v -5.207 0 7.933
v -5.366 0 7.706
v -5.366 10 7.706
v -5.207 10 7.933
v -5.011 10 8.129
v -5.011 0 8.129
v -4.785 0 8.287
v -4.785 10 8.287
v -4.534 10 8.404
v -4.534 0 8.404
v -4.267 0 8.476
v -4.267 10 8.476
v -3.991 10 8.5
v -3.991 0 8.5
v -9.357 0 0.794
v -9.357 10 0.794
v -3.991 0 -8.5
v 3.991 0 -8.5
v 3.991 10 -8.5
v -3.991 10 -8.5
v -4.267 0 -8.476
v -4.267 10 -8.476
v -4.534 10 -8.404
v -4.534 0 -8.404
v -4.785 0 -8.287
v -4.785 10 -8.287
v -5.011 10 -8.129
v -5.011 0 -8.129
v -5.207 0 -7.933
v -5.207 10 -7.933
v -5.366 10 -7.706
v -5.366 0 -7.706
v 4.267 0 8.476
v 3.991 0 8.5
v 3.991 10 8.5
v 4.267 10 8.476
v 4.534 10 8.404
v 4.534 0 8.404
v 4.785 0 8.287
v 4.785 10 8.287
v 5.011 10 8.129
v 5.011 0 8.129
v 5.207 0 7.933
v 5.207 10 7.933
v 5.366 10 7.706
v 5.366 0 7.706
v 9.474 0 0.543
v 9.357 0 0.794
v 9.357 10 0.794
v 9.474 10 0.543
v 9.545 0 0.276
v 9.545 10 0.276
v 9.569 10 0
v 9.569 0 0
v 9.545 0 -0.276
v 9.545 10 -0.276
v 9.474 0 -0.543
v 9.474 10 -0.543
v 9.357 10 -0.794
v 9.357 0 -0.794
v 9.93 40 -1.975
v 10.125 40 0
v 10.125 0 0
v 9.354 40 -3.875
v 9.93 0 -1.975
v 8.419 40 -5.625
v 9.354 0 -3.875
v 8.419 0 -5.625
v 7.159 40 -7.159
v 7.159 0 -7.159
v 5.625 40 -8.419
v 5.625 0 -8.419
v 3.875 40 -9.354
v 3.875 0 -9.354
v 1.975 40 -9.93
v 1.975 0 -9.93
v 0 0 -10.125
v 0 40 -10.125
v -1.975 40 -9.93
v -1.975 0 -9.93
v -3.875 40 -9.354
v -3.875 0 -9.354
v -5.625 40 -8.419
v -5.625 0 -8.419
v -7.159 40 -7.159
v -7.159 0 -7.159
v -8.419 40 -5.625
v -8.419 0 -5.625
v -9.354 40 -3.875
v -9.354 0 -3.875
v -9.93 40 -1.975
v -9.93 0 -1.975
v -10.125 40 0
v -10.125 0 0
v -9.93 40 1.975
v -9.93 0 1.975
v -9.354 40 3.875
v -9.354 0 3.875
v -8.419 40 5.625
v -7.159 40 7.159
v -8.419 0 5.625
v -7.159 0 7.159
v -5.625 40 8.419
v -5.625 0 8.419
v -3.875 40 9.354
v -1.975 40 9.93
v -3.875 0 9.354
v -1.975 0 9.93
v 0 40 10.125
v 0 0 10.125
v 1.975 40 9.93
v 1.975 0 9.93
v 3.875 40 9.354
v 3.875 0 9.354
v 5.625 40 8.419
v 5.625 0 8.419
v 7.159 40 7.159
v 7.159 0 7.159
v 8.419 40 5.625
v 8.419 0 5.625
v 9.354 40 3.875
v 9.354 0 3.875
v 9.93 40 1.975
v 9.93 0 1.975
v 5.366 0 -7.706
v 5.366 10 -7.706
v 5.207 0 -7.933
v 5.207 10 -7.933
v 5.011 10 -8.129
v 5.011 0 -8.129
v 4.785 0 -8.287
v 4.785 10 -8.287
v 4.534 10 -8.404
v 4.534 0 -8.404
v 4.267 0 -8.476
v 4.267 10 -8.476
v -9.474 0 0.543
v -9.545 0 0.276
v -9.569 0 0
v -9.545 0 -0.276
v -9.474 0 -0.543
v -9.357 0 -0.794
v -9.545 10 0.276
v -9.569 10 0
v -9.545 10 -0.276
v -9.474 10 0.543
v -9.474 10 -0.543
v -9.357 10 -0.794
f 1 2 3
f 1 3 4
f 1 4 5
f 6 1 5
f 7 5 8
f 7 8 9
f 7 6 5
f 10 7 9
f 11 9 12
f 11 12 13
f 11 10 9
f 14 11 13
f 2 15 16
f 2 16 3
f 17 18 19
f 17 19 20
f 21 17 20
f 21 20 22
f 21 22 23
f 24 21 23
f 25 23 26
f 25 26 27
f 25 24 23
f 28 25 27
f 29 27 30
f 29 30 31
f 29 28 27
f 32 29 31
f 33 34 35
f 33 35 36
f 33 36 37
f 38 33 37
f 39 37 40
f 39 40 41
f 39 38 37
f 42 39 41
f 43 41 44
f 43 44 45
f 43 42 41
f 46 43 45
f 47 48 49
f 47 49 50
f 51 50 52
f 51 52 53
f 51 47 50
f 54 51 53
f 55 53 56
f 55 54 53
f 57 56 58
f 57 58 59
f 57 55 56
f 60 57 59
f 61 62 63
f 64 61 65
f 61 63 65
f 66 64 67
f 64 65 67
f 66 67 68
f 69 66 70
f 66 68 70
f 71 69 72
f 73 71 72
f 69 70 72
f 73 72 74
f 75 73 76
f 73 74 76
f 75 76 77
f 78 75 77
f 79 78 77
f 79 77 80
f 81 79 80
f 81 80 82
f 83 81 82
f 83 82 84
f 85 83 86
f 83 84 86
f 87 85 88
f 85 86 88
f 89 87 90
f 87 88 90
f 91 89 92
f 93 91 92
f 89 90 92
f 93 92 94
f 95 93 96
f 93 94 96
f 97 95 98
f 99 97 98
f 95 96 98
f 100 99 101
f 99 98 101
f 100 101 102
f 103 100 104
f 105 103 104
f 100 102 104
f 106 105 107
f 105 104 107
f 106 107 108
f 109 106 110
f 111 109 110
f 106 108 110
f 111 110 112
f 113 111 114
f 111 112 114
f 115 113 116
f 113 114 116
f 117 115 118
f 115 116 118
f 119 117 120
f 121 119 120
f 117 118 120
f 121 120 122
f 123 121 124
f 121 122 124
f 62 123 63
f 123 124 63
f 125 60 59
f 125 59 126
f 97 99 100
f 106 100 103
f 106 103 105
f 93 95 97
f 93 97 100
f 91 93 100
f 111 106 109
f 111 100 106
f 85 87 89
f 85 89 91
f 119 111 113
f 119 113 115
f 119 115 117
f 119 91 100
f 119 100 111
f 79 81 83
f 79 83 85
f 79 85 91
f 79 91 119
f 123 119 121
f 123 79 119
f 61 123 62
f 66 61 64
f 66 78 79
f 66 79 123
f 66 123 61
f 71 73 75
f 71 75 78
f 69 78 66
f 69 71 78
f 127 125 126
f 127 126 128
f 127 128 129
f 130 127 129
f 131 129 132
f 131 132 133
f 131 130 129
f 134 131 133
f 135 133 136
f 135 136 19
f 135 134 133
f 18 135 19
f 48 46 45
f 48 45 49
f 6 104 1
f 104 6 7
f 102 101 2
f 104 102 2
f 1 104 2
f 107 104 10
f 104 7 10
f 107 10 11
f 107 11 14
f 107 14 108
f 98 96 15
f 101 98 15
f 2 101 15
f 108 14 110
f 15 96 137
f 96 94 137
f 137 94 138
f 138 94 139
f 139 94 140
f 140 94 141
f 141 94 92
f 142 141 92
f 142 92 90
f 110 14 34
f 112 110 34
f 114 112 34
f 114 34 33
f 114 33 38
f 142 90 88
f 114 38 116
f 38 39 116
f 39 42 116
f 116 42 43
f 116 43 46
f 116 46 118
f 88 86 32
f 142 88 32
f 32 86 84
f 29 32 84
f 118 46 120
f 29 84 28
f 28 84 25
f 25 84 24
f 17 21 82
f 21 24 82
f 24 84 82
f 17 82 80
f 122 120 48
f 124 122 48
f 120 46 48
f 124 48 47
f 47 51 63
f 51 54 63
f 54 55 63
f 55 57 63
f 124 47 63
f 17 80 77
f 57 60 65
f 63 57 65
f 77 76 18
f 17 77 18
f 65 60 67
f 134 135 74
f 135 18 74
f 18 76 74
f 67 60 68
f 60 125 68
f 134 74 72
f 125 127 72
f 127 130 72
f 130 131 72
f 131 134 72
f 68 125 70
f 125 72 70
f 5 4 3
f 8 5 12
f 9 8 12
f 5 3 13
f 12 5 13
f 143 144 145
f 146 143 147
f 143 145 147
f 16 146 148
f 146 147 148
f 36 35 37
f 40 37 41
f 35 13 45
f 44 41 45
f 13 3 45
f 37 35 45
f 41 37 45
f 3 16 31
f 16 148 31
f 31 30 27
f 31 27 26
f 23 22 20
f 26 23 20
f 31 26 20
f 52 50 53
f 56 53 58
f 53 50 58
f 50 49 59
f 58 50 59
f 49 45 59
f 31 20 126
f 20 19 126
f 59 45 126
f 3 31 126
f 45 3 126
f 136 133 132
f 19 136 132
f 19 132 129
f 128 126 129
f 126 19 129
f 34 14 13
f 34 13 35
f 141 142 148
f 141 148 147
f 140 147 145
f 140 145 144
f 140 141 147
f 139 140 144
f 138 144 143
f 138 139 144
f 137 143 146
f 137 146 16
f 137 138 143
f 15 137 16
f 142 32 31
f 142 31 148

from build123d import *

# Parameters (mm, degrees)
SKETCH1_R           = 10.125
BOSS_EXTRUDE1_DEPTH = 10
SKETCH2_R           = 10.125
BOSS_EXTRUDE2_DEPTH = 30


with BuildPart() as part:
    # Sketch1 → Boss-Extrude1 (new body)
    with BuildSketch(Plane(origin=(0, 0, 0), x_dir=(1, 0, 0), z_dir=(0, 1, 0))):
        Circle(SKETCH1_R)
        with BuildLine():
            Line((9.3566828, 0.79375), (5.365749064, 7.70625))
            ThreePointArc((5.365749064, 7.70625), (4.784683736, 8.287315329), (3.990933736, 8.5))
            Line((3.990933736, 8.5), (-3.990933736, 8.5))
            ThreePointArc((-3.990933736, 8.5), (-4.784683736, 8.287315329), (-5.365749064, 7.70625))
            Line((-5.365749064, 7.70625), (-9.3566828, 0.79375))
            ThreePointArc((-9.3566828, 0.79375), (-9.569367472, 0), (-9.3566828, -0.79375))
            Line((-9.3566828, -0.79375), (-5.365749064, -7.70625))
            ThreePointArc((-5.365749064, -7.70625), (-4.784683736, -8.287315329), (-3.990933736, -8.5))
            Line((-3.990933736, -8.5), (3.990933736, -8.5))
            ThreePointArc((3.990933736, -8.5), (4.784683736, -8.287315329), (5.365749064, -7.70625))
            Line((5.365749064, -7.70625), (9.3566828, -0.79375))
            ThreePointArc((9.3566828, -0.79375), (9.569367472, 0), (9.3566828, 0.79375))
        make_face(mode=Mode.SUBTRACT)
    extrude(amount=BOSS_EXTRUDE1_DEPTH)

    # Sketch2 → Boss-Extrude2 (add)
    with BuildSketch(Plane(origin=(0, 10, 0), x_dir=(1, 0, 0), z_dir=(0, 1, 0))):
        Circle(SKETCH2_R)
    extrude(amount=BOSS_EXTRUDE2_DEPTH)


solid = part.part
